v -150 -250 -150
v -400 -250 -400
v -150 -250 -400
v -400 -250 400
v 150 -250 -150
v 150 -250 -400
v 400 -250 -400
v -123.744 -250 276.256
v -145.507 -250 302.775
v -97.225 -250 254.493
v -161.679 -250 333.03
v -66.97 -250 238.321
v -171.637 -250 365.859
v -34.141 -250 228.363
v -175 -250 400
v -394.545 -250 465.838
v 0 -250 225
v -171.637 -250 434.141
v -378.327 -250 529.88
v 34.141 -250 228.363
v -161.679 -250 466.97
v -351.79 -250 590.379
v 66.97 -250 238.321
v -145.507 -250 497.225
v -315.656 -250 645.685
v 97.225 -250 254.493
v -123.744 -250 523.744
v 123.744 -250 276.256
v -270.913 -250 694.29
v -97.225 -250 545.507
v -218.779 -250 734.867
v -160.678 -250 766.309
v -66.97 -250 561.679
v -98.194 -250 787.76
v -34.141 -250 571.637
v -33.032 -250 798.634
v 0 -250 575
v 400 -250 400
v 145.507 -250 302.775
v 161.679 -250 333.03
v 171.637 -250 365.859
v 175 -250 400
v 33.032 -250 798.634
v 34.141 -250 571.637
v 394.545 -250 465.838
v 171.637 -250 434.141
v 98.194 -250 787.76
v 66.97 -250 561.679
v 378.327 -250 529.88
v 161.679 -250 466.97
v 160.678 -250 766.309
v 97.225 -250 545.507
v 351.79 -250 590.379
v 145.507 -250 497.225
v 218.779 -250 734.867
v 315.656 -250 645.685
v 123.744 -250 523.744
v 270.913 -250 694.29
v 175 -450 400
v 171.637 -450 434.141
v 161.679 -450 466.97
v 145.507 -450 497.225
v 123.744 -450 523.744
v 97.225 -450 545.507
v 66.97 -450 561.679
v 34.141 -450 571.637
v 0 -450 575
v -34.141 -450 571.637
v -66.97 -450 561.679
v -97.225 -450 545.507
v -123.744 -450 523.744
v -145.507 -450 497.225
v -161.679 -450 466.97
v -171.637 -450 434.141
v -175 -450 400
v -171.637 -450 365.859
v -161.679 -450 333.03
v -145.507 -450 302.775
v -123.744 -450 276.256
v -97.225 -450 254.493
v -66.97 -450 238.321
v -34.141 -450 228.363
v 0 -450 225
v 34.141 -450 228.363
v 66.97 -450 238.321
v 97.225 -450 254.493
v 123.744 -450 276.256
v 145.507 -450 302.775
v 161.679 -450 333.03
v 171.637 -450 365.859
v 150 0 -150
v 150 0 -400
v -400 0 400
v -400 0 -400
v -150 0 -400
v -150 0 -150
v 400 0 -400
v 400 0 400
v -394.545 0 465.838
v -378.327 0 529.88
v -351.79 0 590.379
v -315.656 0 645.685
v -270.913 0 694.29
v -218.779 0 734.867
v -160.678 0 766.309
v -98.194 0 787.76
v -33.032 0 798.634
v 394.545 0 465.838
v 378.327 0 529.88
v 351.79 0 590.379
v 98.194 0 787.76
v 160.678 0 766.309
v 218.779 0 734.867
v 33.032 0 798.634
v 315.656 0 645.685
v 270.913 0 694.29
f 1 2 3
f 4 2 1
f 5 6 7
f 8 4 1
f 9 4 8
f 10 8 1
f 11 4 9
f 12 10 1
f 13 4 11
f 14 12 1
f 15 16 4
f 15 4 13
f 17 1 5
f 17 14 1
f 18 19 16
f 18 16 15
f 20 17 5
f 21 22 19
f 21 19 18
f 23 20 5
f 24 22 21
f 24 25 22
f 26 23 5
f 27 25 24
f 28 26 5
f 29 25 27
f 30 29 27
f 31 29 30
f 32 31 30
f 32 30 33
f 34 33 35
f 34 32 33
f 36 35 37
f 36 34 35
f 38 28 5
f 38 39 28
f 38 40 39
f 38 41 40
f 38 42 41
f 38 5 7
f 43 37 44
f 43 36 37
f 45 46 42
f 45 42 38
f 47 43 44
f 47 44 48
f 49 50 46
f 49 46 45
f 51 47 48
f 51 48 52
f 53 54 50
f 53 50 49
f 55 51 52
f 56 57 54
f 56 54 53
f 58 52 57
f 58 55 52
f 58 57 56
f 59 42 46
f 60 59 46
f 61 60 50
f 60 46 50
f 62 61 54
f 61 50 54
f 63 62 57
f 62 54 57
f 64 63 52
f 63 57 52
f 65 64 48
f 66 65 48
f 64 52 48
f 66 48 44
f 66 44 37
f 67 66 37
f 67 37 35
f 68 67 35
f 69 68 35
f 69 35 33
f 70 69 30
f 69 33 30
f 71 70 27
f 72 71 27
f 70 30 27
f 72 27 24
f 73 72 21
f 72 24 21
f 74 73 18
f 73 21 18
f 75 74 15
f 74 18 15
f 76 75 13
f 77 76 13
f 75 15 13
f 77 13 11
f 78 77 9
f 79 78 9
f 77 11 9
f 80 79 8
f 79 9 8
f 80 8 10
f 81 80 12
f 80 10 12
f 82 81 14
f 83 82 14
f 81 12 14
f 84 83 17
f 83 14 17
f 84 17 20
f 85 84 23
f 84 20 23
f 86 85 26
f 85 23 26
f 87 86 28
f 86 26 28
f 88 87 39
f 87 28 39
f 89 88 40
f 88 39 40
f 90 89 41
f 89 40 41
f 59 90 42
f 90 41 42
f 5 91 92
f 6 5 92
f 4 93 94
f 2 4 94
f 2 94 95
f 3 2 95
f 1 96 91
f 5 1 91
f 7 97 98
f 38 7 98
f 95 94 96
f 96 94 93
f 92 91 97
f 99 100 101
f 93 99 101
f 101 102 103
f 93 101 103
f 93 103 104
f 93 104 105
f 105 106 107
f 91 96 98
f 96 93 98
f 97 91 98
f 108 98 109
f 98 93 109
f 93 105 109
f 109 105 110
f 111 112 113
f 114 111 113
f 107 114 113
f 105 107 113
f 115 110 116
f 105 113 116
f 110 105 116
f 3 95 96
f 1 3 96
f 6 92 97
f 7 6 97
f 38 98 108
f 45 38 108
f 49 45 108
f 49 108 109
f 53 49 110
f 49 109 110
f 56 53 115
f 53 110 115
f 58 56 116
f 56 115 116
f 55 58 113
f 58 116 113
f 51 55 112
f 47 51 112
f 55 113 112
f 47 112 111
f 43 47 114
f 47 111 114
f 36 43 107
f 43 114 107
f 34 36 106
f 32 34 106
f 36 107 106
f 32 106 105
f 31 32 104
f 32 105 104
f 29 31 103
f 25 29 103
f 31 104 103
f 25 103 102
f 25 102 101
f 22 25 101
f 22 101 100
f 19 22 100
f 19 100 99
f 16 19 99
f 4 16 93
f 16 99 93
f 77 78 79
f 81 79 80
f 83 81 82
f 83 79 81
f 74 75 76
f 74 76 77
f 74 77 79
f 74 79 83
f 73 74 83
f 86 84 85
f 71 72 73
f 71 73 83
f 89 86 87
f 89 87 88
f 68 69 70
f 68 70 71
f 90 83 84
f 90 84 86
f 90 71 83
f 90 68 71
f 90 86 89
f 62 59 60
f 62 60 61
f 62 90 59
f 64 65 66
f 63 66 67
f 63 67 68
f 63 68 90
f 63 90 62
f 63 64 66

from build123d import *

# Parameters (mm, degrees)
F1_DEPTH = 250
F2_R     = 175
F3_DEPTH = 200


with BuildPart() as f1:
    # F0 (on Front) → F1 (new body)
    with BuildSketch(Plane.XZ):
        with BuildLine():
            Line((-400, 400), (-400, -400))
            Line((-400, -400), (-150, -400))
            Line((-150, -400), (-150, -150))
            Line((-150, -150), (150, -150))
            Line((150, -150), (150, -400))
            Line((150, -400), (400, -400))
            Line((400, -400), (400, 400))
            ThreePointArc((400, 400), (0, 800), (-400, 400))
        make_face()
    extrude(amount=F1_DEPTH)

    # F2 (on face) → F3 (join)
    with BuildSketch(Plane.XZ.offset(250)):
        with Locations((0, 400)):
            Circle(F2_R)
    extrude(amount=F3_DEPTH)


solid = f1.part
